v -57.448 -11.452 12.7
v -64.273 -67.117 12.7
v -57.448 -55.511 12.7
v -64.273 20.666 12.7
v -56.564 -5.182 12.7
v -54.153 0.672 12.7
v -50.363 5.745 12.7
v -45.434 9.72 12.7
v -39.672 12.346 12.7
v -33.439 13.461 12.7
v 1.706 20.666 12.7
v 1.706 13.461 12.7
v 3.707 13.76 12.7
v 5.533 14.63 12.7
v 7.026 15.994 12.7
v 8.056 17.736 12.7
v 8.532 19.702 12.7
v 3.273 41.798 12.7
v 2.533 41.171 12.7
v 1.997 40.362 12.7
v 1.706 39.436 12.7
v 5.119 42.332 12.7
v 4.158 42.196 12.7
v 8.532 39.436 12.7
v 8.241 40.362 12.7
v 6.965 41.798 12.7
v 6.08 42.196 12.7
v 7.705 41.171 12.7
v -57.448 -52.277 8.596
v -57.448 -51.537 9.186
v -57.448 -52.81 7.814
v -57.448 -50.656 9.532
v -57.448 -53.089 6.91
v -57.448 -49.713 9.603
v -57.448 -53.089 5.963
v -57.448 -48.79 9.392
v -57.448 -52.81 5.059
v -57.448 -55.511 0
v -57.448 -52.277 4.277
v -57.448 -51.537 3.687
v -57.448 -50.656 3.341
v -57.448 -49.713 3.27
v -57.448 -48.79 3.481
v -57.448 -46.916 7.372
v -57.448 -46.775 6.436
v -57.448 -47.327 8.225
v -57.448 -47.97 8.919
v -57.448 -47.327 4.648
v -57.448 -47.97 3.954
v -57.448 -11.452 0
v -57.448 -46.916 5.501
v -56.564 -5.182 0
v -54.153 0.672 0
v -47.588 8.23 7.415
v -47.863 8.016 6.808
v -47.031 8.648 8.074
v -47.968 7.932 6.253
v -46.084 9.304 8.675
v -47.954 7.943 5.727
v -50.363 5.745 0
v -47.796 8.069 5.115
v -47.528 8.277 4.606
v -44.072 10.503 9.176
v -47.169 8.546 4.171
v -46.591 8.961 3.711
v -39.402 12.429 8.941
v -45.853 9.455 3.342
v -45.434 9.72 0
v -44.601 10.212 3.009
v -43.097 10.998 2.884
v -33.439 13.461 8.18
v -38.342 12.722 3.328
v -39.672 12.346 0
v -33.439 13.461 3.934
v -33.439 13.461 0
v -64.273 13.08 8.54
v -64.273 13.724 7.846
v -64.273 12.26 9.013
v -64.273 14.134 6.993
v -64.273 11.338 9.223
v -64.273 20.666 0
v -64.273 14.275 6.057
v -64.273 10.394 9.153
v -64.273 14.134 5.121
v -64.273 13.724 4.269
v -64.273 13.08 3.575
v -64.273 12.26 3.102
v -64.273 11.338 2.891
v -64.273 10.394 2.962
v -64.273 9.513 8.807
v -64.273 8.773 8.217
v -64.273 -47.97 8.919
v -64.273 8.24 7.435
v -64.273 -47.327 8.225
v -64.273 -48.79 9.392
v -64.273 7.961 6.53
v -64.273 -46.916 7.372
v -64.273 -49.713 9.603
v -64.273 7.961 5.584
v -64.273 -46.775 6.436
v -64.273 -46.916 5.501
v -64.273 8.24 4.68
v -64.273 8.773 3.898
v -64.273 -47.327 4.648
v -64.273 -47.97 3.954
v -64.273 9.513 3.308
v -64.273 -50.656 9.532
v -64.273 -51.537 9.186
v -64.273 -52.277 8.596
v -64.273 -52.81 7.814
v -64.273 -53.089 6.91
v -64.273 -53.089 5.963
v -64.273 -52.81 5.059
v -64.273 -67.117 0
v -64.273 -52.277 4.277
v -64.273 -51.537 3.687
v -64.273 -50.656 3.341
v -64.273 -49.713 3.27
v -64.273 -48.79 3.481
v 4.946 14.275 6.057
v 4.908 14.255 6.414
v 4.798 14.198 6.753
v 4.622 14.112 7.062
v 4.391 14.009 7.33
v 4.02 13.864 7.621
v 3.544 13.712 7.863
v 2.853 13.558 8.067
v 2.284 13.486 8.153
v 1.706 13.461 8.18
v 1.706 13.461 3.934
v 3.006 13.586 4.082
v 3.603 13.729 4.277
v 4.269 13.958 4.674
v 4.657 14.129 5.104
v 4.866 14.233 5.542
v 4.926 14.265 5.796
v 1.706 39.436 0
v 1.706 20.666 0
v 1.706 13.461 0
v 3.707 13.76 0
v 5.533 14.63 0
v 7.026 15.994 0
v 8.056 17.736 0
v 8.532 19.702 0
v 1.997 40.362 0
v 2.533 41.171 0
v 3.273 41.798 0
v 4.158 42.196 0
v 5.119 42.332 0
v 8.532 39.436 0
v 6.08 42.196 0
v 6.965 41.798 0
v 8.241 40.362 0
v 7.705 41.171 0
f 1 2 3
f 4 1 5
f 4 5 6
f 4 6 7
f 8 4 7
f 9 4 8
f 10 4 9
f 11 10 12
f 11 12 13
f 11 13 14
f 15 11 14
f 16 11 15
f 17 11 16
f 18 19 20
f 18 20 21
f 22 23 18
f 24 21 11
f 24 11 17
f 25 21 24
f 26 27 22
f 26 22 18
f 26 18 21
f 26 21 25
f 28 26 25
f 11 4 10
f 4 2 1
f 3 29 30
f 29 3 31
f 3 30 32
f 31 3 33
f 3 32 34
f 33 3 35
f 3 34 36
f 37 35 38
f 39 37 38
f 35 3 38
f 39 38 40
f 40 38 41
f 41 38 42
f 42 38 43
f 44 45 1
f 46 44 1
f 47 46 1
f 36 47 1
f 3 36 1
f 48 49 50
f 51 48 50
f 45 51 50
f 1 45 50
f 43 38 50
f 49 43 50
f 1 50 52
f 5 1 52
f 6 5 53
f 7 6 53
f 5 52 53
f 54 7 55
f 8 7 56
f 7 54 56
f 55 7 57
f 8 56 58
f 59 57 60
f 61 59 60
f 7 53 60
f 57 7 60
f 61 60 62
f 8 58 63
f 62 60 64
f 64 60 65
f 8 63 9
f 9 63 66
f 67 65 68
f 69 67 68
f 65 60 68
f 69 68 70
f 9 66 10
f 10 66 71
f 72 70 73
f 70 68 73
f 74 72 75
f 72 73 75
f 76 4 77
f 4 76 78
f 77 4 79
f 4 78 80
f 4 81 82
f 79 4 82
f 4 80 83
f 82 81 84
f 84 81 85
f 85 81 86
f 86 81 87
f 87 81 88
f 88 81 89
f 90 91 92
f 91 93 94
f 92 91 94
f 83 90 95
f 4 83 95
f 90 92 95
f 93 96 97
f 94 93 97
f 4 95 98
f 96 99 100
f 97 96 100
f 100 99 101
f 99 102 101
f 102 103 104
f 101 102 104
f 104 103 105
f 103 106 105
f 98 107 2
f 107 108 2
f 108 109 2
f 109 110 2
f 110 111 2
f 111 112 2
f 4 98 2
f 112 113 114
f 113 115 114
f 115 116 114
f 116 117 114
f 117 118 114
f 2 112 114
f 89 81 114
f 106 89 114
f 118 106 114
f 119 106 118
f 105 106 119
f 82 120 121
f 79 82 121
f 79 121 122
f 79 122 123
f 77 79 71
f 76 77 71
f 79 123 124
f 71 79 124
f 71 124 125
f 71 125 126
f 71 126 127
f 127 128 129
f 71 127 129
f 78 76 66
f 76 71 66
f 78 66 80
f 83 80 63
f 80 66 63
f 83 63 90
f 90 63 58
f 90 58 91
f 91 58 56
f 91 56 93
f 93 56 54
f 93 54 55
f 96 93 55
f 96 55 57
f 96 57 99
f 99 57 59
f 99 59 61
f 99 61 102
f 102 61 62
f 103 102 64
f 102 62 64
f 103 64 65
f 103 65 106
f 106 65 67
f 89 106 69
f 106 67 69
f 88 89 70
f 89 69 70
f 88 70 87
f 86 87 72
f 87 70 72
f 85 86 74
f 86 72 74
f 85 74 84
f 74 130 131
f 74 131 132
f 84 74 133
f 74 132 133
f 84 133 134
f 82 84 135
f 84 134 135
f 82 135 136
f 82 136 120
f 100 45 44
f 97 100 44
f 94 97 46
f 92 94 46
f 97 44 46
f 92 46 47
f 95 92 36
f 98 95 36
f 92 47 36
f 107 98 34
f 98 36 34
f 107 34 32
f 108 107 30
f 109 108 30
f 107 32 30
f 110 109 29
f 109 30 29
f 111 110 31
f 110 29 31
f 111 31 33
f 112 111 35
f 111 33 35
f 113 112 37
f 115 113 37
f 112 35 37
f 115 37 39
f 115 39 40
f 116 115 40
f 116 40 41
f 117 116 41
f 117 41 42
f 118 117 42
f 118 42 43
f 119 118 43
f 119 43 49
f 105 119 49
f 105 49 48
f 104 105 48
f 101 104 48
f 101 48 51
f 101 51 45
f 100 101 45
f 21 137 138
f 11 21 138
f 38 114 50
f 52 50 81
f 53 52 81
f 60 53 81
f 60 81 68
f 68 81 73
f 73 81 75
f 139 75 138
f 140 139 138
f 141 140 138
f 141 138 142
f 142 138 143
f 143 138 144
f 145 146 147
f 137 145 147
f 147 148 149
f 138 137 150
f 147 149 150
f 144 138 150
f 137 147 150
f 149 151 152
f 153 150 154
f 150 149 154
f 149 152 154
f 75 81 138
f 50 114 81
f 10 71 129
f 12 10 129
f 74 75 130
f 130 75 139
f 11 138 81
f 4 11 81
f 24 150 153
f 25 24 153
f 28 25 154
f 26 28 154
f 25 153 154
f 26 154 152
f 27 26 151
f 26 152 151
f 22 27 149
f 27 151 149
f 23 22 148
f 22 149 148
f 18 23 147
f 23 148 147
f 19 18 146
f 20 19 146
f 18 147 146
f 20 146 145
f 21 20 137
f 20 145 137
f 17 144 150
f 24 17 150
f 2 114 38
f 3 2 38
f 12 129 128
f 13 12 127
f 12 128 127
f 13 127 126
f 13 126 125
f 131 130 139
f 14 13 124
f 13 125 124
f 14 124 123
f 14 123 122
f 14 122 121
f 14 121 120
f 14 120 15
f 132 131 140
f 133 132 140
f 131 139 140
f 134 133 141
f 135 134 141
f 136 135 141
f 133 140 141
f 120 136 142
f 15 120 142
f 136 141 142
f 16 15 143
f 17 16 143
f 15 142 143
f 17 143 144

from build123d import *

# Parameters (mm, degrees)
F1_DEPTH = 12.7
F3_D     = 6.35
F5_DEPTH = 12.701


with BuildPart() as f1:
    # F0 (on Top) → F1 (new body)
    with BuildSketch(Plane.XY):
        with BuildLine():
            Line((-57.44794, 20.666091), (-64.273439, 20.666091))
            Line((-64.273439, 20.666091), (-64.273439, -67.117393))
            Line((-64.273439, -67.117393), (-57.44794, -67.117393))
            Line((-57.44794, -67.117393), (-57.44794, -11.452466))
            ThreePointArc((-57.44794, -11.452466), (-50.363343, 5.745429), (-33.439308, 13.461399))
            Line((-33.439308, 13.461399), (1.706375, 13.461399))
            ThreePointArc((1.706375, 13.461399), (6.33048, 15.256632), (8.531871, 19.701751))
            Line((8.531871, 19.701751), (8.531871, 39.43621))
            ThreePointArc((8.531871, 39.43621), (5.119123, 42.332037), (1.706375, 39.43621))
            Line((1.706375, 39.43621), (1.706375, 20.666091))
            Line((1.706375, 20.666091), (-57.44794, 20.666091))
        make_face()
    extrude(amount=F1_DEPTH)

    # F3 (through all)
    with Locations(Plane(origin=(-64.273439, 0, 0), x_dir=(0, -1, 0), z_dir=(-1, 0, 0))):
        with Locations((-11.100469, 6.05725), (49.949814, 6.436449)):
            Hole(F3_D / 2)

    # F4 (on face) → F5 (cut, through all)
    with BuildSketch(Plane(origin=(0, 0, 0), x_dir=(1, 0, 0), z_dir=(0, 0, -1))):
        Polygon((-57.44794, 67.117393), (-64.273439, 67.117393), (-57.44794, 55.511292), align=None)
    extrude(amount=-F5_DEPTH, mode=Mode.SUBTRACT)


solid = f1.part
